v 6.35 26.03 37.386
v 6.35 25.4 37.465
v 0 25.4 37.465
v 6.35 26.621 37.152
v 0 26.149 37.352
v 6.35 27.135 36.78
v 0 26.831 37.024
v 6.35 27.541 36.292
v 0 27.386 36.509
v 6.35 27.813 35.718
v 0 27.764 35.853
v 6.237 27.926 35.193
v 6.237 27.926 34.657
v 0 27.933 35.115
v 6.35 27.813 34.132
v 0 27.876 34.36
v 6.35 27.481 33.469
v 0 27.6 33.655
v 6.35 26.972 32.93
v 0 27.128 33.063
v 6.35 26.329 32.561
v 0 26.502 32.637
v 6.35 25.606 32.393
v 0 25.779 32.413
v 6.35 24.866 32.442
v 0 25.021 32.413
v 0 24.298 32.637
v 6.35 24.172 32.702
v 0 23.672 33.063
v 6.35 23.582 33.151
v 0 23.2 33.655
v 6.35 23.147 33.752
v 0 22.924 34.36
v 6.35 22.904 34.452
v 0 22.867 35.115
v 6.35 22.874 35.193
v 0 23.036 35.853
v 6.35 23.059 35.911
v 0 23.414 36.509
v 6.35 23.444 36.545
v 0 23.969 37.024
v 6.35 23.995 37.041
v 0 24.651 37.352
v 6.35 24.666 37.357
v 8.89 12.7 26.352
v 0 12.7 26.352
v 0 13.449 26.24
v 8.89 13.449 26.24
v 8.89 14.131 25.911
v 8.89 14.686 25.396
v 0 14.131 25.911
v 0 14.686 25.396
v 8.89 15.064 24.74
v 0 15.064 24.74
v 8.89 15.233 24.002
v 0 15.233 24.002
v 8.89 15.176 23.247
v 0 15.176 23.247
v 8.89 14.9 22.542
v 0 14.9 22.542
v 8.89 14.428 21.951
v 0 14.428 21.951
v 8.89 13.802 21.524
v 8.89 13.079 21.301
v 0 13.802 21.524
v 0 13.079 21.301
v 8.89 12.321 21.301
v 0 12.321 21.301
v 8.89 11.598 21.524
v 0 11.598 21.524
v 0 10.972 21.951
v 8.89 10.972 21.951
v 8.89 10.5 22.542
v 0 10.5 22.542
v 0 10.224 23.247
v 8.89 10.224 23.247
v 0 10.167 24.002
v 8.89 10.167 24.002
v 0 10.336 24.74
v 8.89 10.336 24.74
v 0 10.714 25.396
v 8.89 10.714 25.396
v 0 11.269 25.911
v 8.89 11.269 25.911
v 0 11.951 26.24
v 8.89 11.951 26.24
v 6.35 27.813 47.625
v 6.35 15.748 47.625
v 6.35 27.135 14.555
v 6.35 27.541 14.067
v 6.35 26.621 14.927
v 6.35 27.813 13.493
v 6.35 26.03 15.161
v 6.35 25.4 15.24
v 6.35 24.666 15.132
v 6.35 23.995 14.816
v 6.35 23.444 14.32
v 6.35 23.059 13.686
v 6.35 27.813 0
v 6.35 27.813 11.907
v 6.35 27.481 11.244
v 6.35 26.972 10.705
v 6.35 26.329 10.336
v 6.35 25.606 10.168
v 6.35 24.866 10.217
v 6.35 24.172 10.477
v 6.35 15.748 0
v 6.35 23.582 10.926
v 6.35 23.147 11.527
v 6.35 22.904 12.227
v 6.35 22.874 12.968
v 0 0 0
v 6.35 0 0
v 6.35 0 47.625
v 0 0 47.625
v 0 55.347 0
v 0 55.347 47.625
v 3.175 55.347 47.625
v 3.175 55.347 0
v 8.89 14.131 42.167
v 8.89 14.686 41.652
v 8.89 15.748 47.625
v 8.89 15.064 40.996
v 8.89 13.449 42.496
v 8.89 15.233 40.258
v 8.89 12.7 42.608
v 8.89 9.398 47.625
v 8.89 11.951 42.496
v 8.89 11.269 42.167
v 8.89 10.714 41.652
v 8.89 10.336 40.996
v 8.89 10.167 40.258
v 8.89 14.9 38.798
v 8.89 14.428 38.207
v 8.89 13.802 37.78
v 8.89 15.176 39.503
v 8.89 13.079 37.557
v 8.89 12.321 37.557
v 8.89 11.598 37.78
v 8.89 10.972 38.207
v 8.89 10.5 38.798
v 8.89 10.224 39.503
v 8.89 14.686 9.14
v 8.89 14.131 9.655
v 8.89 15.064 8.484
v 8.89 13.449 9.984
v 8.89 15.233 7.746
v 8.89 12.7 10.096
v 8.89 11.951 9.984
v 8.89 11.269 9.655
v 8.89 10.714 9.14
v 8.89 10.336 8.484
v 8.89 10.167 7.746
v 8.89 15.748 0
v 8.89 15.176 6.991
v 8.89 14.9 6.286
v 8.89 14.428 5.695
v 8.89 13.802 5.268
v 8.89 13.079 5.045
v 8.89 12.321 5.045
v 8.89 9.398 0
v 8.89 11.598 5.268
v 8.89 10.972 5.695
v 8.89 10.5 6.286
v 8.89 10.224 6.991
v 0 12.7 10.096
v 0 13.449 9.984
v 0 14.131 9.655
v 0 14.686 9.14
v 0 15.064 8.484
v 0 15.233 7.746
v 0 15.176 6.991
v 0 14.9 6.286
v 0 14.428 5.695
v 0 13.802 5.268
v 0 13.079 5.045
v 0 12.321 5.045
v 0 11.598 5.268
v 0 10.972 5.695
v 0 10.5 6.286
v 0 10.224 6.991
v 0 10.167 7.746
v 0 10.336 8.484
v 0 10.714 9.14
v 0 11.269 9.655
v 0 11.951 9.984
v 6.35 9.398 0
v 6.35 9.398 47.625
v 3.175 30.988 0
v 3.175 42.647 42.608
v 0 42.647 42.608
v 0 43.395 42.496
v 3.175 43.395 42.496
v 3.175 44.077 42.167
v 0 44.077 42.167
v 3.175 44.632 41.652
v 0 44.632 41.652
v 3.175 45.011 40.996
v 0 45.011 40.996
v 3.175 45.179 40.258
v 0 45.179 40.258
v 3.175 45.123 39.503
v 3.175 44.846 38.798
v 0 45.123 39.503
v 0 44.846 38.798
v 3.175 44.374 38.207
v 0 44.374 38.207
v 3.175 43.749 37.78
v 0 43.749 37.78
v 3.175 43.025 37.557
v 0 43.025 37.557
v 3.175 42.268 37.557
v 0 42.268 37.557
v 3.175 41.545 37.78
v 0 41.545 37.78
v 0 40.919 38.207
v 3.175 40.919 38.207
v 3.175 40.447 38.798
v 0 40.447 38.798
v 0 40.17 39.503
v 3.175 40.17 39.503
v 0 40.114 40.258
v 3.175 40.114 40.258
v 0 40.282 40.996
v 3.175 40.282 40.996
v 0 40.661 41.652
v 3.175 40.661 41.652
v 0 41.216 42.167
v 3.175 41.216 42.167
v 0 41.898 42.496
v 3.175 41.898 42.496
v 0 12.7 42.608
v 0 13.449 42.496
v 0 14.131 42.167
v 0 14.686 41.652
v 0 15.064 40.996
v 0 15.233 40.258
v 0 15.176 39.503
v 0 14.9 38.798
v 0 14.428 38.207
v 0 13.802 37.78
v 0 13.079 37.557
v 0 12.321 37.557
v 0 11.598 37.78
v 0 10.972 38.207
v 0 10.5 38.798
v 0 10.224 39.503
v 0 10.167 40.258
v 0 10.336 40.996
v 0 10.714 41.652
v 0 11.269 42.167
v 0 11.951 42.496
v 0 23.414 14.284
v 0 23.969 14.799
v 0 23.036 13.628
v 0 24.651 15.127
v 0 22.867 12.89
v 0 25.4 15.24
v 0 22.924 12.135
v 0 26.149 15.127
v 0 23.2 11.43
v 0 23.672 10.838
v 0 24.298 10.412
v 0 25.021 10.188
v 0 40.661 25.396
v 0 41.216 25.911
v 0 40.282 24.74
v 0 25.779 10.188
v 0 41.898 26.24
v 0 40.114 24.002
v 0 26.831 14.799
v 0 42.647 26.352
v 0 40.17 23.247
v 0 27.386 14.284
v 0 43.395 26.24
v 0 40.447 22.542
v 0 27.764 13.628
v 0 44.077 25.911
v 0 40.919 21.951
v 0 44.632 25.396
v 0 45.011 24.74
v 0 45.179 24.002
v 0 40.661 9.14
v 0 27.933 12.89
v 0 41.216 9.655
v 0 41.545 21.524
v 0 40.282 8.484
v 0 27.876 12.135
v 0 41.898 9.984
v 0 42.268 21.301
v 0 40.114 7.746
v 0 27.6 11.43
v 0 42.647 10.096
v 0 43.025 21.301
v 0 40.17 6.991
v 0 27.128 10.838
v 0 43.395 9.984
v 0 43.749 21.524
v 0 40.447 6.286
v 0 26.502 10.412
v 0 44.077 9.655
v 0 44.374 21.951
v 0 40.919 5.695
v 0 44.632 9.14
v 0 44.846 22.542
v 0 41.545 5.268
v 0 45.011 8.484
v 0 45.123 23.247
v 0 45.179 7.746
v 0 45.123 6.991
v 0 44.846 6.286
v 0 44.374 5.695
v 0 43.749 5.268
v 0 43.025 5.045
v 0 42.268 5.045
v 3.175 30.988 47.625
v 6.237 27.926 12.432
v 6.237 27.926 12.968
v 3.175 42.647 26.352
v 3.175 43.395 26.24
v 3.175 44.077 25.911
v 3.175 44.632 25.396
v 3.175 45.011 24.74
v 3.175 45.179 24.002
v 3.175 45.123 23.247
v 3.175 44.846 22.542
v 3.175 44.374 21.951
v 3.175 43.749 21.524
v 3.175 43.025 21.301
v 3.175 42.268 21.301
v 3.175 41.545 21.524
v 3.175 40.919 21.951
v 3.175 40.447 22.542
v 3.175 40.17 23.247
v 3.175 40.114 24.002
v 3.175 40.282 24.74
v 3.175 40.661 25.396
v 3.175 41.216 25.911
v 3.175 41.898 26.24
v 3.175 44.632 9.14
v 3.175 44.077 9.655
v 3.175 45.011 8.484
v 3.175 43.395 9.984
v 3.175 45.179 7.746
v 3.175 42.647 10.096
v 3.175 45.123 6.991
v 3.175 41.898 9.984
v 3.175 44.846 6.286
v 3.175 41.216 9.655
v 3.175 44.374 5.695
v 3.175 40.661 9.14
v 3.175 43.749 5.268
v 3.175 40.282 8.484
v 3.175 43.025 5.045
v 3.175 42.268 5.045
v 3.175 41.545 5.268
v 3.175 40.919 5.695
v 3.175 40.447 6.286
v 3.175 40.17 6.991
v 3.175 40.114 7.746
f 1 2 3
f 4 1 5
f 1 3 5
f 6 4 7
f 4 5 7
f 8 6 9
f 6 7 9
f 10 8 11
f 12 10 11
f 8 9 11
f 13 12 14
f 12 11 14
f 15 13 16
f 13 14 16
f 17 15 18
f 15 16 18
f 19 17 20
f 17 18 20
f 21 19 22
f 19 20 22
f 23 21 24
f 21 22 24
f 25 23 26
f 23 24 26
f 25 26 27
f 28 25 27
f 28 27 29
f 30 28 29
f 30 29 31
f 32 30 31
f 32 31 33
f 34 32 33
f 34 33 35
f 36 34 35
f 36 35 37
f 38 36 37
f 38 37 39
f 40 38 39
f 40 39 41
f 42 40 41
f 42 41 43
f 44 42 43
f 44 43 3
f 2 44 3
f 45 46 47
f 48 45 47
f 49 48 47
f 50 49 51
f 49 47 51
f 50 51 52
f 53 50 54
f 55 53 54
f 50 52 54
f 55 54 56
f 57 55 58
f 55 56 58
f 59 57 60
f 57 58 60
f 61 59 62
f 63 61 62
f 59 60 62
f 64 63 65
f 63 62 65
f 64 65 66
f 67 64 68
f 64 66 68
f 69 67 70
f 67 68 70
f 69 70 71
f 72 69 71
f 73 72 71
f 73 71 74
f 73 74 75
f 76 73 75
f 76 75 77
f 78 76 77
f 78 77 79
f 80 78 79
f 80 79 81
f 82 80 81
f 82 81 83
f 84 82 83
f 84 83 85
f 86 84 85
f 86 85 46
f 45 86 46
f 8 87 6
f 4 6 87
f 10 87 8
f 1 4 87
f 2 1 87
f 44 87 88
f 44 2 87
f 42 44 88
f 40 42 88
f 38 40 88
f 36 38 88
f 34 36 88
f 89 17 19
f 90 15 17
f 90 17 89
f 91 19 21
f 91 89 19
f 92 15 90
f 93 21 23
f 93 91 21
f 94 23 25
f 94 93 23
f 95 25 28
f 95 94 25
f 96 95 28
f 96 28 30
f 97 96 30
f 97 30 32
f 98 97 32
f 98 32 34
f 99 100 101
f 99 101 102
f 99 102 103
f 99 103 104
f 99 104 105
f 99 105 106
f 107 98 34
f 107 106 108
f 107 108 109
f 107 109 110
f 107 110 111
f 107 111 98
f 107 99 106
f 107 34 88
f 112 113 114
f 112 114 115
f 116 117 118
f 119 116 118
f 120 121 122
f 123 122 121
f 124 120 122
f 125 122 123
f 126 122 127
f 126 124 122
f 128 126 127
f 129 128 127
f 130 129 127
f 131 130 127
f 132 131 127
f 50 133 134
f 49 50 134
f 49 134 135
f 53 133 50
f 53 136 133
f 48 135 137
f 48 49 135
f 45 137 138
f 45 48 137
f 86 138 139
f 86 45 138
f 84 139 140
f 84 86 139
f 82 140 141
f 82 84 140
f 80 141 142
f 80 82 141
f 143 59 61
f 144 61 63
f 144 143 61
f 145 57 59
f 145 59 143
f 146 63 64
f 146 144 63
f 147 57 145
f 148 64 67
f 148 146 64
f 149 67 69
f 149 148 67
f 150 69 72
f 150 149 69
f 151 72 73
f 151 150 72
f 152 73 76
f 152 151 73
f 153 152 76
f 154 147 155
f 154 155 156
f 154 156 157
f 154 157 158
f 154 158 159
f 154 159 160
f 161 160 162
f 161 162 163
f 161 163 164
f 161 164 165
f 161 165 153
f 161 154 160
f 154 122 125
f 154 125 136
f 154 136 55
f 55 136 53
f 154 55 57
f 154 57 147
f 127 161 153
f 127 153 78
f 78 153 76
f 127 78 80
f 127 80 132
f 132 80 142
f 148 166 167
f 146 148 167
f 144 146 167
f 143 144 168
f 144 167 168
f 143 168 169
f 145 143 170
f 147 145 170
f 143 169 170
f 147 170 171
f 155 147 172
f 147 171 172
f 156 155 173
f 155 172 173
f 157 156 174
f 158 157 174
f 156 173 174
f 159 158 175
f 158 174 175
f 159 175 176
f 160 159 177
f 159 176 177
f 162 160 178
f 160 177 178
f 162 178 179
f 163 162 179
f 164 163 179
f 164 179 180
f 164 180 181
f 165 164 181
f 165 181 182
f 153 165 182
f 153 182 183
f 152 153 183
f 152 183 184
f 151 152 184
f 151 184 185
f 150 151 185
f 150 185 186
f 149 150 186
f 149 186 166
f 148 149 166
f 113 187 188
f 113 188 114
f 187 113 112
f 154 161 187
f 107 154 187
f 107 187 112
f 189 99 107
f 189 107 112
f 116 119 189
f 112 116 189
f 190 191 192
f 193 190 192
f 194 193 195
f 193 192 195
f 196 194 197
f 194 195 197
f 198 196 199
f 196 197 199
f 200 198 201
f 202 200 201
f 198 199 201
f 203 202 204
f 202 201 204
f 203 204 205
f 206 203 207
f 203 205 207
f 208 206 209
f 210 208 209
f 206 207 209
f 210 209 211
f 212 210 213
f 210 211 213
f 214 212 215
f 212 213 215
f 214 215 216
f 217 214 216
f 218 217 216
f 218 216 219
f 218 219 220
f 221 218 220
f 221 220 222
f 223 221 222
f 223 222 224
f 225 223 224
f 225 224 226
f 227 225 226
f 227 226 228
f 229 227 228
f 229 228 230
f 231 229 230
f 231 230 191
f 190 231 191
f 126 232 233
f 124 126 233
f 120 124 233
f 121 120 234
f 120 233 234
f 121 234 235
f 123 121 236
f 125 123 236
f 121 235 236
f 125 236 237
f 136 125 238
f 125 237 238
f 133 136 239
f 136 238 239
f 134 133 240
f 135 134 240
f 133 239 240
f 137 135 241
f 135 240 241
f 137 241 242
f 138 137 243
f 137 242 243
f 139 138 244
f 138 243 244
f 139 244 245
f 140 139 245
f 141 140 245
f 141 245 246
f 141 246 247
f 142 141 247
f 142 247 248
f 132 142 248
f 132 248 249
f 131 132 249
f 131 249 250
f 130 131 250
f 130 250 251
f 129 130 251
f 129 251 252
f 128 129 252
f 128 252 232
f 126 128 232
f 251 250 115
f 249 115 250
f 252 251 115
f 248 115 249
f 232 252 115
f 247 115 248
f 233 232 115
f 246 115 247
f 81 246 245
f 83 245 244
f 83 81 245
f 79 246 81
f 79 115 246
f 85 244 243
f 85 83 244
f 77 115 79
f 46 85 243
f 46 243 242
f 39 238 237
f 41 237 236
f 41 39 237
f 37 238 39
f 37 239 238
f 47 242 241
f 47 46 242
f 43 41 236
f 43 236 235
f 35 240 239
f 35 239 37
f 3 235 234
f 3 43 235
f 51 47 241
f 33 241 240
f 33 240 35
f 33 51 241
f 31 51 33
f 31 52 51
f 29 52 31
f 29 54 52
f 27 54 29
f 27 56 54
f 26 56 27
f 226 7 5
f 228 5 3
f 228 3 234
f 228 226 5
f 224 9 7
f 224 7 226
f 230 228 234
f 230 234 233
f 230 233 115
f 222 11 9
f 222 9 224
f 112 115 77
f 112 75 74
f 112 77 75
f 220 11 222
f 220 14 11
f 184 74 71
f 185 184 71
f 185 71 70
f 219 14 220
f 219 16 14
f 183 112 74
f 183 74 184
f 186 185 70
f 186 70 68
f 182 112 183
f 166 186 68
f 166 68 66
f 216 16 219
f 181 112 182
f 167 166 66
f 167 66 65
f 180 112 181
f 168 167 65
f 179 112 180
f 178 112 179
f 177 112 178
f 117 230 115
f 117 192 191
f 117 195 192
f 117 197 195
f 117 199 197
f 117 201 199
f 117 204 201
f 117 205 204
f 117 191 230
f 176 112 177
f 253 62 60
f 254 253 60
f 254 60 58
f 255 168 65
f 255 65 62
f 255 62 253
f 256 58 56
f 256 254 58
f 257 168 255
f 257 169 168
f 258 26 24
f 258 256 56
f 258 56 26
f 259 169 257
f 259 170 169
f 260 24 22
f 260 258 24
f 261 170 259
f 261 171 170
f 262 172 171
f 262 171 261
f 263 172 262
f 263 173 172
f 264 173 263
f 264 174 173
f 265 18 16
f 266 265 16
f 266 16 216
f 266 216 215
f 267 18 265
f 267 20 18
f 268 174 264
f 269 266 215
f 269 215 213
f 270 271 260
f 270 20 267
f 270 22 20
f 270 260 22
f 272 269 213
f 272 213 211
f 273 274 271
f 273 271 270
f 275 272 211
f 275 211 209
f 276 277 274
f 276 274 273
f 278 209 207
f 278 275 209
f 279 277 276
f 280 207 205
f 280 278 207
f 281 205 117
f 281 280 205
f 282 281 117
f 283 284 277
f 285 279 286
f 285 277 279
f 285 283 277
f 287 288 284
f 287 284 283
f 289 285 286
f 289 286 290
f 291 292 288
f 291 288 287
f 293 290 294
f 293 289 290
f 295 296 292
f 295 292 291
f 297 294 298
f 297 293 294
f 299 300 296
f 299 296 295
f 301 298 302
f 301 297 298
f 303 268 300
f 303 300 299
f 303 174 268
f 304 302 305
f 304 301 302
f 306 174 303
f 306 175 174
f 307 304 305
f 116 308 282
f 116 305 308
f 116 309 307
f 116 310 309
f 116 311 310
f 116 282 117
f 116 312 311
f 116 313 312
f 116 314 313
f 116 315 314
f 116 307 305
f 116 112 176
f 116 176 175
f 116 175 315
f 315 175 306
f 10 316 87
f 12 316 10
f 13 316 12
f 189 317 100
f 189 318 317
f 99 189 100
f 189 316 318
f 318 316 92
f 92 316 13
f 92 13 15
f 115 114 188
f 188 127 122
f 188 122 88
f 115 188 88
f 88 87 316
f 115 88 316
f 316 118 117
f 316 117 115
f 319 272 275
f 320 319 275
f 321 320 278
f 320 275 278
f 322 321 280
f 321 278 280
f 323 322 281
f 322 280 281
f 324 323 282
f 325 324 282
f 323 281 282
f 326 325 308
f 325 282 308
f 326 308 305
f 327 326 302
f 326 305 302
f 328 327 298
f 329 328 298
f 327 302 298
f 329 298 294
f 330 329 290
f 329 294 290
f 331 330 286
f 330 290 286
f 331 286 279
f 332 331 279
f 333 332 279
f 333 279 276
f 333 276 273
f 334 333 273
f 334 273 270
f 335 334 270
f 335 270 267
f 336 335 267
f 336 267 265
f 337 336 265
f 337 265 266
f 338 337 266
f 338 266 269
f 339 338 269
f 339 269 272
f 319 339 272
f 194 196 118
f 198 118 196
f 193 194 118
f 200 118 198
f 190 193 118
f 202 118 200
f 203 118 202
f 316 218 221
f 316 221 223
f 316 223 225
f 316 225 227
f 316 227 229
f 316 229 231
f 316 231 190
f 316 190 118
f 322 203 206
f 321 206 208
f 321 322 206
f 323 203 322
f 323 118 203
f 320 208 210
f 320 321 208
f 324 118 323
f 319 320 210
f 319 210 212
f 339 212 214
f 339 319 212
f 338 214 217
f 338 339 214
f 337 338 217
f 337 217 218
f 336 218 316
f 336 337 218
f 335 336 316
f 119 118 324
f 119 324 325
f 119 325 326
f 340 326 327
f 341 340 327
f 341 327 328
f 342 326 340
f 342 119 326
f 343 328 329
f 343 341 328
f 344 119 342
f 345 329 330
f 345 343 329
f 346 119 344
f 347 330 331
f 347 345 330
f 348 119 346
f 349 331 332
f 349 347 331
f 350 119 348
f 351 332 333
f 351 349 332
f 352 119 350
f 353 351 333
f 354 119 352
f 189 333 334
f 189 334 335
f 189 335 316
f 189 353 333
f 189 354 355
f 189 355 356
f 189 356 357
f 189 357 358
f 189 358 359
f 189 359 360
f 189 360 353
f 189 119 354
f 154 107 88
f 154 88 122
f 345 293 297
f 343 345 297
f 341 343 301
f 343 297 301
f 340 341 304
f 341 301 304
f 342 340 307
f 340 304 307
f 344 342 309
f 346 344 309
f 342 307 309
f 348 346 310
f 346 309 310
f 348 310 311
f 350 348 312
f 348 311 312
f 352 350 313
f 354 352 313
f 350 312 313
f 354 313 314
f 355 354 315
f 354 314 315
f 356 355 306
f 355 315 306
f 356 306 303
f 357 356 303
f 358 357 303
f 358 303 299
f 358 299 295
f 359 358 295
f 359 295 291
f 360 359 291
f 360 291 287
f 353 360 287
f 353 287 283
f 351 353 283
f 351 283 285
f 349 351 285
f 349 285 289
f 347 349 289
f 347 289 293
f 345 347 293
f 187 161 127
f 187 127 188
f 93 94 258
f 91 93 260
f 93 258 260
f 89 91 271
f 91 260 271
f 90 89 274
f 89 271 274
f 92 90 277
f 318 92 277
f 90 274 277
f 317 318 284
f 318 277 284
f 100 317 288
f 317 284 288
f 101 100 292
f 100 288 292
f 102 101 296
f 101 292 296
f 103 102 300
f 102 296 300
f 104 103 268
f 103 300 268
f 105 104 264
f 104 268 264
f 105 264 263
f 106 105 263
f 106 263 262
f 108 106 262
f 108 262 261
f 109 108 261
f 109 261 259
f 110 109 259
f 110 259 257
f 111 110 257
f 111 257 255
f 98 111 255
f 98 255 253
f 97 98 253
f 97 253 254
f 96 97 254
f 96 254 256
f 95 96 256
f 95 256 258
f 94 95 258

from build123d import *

# Parameters (mm, degrees)
BOSS_EXTRUDE1_DEPTH = 47.625
SKETCH2_R           = 2.54
CUT_EXTRUDE1_DEPTH  = 9.89


with BuildPart() as part:
    # Sketch1 → Boss-Extrude1 (new body)
    with BuildSketch(Plane.XY):
        Polygon((0, 0), (0, 55.3466), (3.175, 55.3466), (3.175, 30.988), (6.35, 27.813), (6.35, 15.748), (8.89, 15.748), (8.89, 9.398), (6.35, 9.398), (6.35, 0), align=None)
    extrude(amount=BOSS_EXTRUDE1_DEPTH)

    # Sketch2 → Cut-Extrude1 (cut, through all)
    with BuildSketch(Plane.ZY):
        with Locations((40.0685, 12.7)):
            Circle(SKETCH2_R)
        with Locations((7.5565, 12.7)):
            Circle(SKETCH2_R)
        with Locations((12.7, 25.4)):
            Circle(SKETCH2_R)
        with Locations((34.925, 25.4)):
            Circle(SKETCH2_R)
        with Locations((7.5565, 42.6466)):
            Circle(SKETCH2_R)
        with Locations((40.0685, 42.6466)):
            Circle(SKETCH2_R)
        with Locations((23.8125, 12.7)):
            Circle(SKETCH2_R)
        with Locations((23.8125, 42.6466)):
            Circle(SKETCH2_R)
    extrude(amount=-CUT_EXTRUDE1_DEPTH, mode=Mode.SUBTRACT)


solid = part.part
